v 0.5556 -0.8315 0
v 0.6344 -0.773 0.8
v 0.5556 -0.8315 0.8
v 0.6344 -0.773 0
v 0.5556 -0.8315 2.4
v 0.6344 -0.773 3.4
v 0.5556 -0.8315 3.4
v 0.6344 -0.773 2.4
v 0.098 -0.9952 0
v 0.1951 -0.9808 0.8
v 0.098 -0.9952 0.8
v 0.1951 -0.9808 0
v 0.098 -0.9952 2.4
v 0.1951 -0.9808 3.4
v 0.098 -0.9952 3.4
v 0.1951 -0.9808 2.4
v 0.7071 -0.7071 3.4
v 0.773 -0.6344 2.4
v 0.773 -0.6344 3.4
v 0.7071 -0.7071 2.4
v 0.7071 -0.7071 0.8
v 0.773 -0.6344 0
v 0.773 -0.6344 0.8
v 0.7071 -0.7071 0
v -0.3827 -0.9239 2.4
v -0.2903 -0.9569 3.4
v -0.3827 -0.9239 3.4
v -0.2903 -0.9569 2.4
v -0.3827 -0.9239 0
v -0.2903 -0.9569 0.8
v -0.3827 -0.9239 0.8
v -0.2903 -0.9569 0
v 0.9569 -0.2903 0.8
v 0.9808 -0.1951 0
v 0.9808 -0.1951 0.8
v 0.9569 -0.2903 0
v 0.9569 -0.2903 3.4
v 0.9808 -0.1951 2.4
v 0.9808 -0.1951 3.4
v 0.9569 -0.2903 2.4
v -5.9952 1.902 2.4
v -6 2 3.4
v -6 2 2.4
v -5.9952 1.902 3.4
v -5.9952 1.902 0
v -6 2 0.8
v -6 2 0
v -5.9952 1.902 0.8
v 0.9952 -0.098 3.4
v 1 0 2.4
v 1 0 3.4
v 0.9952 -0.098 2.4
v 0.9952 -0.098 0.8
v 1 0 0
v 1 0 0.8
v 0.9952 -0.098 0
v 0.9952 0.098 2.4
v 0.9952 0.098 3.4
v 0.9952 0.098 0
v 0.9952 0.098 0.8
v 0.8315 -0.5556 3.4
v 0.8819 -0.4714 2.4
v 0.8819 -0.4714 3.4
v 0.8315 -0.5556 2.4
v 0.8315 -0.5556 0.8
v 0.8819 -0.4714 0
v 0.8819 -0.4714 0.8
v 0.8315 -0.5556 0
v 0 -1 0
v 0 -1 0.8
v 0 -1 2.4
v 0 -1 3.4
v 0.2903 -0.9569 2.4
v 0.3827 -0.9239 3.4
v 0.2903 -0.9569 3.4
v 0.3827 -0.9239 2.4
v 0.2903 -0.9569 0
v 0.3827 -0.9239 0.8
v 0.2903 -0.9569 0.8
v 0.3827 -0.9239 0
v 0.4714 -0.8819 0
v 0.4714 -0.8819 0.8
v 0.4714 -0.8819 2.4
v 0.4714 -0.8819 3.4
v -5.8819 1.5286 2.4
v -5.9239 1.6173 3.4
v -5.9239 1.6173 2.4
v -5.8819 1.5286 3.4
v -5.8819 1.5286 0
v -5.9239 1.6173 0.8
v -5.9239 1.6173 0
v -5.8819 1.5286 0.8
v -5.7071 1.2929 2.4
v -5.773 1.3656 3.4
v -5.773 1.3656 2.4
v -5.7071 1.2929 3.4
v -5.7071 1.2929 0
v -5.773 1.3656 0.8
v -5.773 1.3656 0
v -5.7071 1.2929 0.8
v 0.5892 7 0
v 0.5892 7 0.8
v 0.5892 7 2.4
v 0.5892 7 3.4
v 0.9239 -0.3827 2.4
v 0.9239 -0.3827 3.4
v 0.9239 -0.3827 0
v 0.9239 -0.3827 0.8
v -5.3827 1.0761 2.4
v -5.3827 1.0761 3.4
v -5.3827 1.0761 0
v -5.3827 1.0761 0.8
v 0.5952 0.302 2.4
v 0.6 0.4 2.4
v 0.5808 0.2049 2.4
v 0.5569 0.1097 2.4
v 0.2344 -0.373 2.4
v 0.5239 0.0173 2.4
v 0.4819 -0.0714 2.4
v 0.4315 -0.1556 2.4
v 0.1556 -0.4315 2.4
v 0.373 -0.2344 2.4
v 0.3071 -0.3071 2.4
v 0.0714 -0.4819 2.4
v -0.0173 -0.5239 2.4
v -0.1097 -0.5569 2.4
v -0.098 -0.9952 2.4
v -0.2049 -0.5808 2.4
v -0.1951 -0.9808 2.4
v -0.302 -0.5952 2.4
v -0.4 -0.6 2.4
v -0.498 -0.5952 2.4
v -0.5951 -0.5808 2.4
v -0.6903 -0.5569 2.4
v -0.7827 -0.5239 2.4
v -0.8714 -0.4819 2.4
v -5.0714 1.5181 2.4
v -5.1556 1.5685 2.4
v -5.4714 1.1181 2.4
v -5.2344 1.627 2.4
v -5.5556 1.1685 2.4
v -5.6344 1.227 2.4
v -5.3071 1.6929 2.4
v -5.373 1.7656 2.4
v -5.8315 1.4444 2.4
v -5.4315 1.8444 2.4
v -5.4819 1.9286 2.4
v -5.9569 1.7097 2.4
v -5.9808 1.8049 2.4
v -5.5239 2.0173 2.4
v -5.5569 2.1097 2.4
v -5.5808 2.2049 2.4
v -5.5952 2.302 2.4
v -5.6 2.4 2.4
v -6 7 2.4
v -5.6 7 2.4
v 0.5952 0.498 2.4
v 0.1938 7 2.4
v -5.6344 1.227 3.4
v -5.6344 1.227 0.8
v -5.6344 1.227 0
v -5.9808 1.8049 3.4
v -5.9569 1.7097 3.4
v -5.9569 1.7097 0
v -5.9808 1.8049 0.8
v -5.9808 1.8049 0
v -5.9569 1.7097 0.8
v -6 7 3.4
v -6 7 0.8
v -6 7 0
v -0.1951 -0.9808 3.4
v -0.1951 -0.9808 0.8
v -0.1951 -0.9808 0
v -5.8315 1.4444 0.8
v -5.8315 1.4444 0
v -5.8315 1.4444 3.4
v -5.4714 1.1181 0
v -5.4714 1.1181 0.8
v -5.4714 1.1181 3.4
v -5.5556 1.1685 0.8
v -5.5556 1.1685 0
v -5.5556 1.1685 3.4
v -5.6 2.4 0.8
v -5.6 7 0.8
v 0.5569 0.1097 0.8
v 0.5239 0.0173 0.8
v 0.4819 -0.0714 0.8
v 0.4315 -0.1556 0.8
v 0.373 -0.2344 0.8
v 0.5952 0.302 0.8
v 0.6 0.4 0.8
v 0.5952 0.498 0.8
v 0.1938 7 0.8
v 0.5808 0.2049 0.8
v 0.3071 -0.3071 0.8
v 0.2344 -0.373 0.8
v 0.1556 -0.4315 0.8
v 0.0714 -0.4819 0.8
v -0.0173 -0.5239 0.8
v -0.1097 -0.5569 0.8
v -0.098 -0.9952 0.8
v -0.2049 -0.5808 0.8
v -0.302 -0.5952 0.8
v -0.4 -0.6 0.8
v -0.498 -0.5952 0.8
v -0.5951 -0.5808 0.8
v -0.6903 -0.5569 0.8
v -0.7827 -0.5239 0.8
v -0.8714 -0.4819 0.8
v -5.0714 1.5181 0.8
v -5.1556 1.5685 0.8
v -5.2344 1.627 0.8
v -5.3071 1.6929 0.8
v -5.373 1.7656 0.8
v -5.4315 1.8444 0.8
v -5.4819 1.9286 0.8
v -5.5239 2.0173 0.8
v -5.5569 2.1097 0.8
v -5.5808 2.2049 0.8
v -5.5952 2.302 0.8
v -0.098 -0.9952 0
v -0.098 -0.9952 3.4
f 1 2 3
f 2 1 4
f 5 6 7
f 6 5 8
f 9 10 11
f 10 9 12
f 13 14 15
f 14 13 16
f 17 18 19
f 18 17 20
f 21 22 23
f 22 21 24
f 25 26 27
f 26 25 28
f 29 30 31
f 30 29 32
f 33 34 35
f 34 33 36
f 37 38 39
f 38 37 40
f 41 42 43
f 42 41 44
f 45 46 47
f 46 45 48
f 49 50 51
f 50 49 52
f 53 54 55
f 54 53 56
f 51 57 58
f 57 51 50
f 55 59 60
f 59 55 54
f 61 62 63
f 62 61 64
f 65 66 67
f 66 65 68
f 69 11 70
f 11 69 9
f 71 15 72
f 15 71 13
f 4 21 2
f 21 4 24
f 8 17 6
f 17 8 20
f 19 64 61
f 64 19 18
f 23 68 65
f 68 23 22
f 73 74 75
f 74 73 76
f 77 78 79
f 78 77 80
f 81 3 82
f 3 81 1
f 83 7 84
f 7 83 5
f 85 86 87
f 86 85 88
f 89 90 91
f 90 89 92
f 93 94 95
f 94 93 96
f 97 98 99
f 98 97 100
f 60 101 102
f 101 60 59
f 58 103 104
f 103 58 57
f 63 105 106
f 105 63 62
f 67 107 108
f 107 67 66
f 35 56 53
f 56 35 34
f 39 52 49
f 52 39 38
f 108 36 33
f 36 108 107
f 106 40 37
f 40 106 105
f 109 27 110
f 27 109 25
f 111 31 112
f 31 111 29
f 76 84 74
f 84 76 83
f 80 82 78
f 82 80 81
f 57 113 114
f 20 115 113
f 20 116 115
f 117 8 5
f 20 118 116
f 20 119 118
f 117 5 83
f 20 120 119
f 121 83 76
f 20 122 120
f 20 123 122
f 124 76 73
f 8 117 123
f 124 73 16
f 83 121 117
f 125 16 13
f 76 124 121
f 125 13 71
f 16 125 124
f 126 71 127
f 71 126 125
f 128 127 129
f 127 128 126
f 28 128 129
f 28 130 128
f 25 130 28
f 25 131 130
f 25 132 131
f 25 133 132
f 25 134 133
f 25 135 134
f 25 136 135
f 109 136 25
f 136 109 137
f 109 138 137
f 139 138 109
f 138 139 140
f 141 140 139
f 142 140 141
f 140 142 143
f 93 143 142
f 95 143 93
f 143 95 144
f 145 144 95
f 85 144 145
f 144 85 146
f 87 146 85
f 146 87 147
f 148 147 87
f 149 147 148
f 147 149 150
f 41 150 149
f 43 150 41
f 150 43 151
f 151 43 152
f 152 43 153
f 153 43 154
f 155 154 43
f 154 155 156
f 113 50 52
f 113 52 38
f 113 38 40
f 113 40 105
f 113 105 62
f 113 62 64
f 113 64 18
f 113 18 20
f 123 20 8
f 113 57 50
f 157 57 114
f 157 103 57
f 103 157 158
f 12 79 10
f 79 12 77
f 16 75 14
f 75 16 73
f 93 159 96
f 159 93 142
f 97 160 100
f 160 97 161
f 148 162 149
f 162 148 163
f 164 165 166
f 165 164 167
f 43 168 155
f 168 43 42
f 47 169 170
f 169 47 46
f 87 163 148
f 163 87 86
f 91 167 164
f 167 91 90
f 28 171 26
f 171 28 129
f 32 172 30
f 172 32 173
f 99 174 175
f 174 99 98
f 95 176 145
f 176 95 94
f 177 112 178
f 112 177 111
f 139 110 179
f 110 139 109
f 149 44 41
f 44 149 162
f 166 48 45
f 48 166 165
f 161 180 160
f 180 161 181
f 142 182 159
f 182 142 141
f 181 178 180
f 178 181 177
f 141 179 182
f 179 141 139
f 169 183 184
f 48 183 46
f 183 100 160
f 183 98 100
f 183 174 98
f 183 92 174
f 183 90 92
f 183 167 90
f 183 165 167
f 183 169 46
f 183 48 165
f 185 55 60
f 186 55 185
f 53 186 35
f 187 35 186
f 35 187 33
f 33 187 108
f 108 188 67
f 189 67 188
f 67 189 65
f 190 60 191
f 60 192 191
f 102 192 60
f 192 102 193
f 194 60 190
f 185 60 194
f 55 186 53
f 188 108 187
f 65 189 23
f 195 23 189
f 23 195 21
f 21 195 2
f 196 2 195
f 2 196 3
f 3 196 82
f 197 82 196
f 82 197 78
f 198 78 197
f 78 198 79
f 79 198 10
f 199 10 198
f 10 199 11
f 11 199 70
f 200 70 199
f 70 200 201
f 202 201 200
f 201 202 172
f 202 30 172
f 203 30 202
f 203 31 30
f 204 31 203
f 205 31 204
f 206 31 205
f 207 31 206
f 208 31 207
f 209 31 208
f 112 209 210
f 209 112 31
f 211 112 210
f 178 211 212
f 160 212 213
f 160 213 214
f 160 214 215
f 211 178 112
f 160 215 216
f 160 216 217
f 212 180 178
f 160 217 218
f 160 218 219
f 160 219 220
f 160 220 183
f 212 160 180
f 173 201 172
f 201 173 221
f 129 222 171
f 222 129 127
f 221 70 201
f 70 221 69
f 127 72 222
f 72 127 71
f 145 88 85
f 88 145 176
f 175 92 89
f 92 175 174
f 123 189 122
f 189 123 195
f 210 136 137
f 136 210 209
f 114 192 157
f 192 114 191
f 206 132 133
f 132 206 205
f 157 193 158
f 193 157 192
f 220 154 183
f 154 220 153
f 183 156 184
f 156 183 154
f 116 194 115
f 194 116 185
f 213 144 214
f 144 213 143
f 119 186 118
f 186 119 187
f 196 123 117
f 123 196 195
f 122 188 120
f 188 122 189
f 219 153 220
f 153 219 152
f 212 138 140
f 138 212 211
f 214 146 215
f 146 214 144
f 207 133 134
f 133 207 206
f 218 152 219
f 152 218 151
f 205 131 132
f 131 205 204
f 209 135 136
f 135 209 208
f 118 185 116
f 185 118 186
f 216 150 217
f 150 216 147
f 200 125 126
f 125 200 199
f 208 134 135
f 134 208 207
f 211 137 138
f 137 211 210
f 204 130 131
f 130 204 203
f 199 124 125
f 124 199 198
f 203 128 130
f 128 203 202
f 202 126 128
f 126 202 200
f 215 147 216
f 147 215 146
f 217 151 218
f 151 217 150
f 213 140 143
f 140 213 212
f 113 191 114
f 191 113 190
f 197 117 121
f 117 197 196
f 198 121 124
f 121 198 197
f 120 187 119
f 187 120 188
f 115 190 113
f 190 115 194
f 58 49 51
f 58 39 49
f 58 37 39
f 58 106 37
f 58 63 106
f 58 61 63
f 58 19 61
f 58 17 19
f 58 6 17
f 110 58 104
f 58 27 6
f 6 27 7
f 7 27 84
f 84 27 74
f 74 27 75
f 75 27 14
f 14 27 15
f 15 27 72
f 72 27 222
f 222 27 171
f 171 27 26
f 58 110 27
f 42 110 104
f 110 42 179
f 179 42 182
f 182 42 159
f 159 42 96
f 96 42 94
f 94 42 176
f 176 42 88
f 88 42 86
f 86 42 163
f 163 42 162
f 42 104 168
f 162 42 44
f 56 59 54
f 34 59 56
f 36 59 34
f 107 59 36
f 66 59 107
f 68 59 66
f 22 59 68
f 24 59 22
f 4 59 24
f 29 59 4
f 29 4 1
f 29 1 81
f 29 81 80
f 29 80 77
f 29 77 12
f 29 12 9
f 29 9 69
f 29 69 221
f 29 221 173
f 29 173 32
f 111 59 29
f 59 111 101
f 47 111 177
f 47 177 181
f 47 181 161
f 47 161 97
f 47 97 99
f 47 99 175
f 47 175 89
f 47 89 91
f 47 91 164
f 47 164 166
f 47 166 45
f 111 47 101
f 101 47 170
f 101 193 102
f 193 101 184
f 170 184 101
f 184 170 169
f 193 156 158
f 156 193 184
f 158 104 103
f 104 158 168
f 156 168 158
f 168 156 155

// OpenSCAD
$fn = 64;
module plate(h = 3.4) {
  x1 = 1;
  x2 = 5;
  y1 = 17;
  y2 = 15;
  y3 = 2;
  ins = 1.6;
  difference() {
    hull() {
      translate([x2, y3, 0]) {
        cylinder(h = h, r = 1);
      }
      translate([x1, y1, 0]) {
        cylinder(h = h, r = 1);
      }
      translate([x2, y2, 0]) {
        cylinder(h = h, r = 1);
      }
      translate([0, 0, 0]) {
        cylinder(h = h, r = 1);
      }
    }
    shift = 0.4;
    translate([0, 0, 0.8]) {
      difference() {
        hull() {
          translate([x2, y3, 0]) {
            cylinder(h = ins, r = 1);
          }
          translate([x1, y1, 0]) {
            cylinder(h = ins, r = 1);
          }
          translate([x2, y2, 0]) {
            cylinder(h = ins, r = 1);
          }
          translate([0, 0, 0]) {
            cylinder(h = ins, r = 1);
          }
        }
        hull() {
          translate([x2 - shift, y3 + shift, 0]) {
            cylinder(h = ins, r = 1);
          }
          translate([x1 + shift, y1 - shift, 0]) {
            cylinder(h = ins, r = 1);
          }
          translate([x2 - shift, y2 - shift, 0]) {
            cylinder(h = ins, r = 1);
          }
          translate([shift, shift, 0]) {
            cylinder(h = ins, r = 1);
          }
        }
      }
    }
  }
}

angle = 35;

module standoff(cut = true) {
  translate([2.86, 8, -5]) {
    intersection() {
      rotate(angle, [-1, 0, 0]) {
        difference() {
          cylinder(h = 10 + 10, r = 2.8);
          if (cut) {
            cylinder(h = 10 + 20, r = 2.1);
          }
        }
      }

      translate([-5, -5, 5]) {
        cube([10, 20, 7]);
      }
    }
  }
}

len = 8;

mirror([1, 0, 0]) {
  intersection() {
    plate(h = 3.4);
    translate([-2, -1, 0]) {
      cube([10, len, 5]);
    }
  }
}
